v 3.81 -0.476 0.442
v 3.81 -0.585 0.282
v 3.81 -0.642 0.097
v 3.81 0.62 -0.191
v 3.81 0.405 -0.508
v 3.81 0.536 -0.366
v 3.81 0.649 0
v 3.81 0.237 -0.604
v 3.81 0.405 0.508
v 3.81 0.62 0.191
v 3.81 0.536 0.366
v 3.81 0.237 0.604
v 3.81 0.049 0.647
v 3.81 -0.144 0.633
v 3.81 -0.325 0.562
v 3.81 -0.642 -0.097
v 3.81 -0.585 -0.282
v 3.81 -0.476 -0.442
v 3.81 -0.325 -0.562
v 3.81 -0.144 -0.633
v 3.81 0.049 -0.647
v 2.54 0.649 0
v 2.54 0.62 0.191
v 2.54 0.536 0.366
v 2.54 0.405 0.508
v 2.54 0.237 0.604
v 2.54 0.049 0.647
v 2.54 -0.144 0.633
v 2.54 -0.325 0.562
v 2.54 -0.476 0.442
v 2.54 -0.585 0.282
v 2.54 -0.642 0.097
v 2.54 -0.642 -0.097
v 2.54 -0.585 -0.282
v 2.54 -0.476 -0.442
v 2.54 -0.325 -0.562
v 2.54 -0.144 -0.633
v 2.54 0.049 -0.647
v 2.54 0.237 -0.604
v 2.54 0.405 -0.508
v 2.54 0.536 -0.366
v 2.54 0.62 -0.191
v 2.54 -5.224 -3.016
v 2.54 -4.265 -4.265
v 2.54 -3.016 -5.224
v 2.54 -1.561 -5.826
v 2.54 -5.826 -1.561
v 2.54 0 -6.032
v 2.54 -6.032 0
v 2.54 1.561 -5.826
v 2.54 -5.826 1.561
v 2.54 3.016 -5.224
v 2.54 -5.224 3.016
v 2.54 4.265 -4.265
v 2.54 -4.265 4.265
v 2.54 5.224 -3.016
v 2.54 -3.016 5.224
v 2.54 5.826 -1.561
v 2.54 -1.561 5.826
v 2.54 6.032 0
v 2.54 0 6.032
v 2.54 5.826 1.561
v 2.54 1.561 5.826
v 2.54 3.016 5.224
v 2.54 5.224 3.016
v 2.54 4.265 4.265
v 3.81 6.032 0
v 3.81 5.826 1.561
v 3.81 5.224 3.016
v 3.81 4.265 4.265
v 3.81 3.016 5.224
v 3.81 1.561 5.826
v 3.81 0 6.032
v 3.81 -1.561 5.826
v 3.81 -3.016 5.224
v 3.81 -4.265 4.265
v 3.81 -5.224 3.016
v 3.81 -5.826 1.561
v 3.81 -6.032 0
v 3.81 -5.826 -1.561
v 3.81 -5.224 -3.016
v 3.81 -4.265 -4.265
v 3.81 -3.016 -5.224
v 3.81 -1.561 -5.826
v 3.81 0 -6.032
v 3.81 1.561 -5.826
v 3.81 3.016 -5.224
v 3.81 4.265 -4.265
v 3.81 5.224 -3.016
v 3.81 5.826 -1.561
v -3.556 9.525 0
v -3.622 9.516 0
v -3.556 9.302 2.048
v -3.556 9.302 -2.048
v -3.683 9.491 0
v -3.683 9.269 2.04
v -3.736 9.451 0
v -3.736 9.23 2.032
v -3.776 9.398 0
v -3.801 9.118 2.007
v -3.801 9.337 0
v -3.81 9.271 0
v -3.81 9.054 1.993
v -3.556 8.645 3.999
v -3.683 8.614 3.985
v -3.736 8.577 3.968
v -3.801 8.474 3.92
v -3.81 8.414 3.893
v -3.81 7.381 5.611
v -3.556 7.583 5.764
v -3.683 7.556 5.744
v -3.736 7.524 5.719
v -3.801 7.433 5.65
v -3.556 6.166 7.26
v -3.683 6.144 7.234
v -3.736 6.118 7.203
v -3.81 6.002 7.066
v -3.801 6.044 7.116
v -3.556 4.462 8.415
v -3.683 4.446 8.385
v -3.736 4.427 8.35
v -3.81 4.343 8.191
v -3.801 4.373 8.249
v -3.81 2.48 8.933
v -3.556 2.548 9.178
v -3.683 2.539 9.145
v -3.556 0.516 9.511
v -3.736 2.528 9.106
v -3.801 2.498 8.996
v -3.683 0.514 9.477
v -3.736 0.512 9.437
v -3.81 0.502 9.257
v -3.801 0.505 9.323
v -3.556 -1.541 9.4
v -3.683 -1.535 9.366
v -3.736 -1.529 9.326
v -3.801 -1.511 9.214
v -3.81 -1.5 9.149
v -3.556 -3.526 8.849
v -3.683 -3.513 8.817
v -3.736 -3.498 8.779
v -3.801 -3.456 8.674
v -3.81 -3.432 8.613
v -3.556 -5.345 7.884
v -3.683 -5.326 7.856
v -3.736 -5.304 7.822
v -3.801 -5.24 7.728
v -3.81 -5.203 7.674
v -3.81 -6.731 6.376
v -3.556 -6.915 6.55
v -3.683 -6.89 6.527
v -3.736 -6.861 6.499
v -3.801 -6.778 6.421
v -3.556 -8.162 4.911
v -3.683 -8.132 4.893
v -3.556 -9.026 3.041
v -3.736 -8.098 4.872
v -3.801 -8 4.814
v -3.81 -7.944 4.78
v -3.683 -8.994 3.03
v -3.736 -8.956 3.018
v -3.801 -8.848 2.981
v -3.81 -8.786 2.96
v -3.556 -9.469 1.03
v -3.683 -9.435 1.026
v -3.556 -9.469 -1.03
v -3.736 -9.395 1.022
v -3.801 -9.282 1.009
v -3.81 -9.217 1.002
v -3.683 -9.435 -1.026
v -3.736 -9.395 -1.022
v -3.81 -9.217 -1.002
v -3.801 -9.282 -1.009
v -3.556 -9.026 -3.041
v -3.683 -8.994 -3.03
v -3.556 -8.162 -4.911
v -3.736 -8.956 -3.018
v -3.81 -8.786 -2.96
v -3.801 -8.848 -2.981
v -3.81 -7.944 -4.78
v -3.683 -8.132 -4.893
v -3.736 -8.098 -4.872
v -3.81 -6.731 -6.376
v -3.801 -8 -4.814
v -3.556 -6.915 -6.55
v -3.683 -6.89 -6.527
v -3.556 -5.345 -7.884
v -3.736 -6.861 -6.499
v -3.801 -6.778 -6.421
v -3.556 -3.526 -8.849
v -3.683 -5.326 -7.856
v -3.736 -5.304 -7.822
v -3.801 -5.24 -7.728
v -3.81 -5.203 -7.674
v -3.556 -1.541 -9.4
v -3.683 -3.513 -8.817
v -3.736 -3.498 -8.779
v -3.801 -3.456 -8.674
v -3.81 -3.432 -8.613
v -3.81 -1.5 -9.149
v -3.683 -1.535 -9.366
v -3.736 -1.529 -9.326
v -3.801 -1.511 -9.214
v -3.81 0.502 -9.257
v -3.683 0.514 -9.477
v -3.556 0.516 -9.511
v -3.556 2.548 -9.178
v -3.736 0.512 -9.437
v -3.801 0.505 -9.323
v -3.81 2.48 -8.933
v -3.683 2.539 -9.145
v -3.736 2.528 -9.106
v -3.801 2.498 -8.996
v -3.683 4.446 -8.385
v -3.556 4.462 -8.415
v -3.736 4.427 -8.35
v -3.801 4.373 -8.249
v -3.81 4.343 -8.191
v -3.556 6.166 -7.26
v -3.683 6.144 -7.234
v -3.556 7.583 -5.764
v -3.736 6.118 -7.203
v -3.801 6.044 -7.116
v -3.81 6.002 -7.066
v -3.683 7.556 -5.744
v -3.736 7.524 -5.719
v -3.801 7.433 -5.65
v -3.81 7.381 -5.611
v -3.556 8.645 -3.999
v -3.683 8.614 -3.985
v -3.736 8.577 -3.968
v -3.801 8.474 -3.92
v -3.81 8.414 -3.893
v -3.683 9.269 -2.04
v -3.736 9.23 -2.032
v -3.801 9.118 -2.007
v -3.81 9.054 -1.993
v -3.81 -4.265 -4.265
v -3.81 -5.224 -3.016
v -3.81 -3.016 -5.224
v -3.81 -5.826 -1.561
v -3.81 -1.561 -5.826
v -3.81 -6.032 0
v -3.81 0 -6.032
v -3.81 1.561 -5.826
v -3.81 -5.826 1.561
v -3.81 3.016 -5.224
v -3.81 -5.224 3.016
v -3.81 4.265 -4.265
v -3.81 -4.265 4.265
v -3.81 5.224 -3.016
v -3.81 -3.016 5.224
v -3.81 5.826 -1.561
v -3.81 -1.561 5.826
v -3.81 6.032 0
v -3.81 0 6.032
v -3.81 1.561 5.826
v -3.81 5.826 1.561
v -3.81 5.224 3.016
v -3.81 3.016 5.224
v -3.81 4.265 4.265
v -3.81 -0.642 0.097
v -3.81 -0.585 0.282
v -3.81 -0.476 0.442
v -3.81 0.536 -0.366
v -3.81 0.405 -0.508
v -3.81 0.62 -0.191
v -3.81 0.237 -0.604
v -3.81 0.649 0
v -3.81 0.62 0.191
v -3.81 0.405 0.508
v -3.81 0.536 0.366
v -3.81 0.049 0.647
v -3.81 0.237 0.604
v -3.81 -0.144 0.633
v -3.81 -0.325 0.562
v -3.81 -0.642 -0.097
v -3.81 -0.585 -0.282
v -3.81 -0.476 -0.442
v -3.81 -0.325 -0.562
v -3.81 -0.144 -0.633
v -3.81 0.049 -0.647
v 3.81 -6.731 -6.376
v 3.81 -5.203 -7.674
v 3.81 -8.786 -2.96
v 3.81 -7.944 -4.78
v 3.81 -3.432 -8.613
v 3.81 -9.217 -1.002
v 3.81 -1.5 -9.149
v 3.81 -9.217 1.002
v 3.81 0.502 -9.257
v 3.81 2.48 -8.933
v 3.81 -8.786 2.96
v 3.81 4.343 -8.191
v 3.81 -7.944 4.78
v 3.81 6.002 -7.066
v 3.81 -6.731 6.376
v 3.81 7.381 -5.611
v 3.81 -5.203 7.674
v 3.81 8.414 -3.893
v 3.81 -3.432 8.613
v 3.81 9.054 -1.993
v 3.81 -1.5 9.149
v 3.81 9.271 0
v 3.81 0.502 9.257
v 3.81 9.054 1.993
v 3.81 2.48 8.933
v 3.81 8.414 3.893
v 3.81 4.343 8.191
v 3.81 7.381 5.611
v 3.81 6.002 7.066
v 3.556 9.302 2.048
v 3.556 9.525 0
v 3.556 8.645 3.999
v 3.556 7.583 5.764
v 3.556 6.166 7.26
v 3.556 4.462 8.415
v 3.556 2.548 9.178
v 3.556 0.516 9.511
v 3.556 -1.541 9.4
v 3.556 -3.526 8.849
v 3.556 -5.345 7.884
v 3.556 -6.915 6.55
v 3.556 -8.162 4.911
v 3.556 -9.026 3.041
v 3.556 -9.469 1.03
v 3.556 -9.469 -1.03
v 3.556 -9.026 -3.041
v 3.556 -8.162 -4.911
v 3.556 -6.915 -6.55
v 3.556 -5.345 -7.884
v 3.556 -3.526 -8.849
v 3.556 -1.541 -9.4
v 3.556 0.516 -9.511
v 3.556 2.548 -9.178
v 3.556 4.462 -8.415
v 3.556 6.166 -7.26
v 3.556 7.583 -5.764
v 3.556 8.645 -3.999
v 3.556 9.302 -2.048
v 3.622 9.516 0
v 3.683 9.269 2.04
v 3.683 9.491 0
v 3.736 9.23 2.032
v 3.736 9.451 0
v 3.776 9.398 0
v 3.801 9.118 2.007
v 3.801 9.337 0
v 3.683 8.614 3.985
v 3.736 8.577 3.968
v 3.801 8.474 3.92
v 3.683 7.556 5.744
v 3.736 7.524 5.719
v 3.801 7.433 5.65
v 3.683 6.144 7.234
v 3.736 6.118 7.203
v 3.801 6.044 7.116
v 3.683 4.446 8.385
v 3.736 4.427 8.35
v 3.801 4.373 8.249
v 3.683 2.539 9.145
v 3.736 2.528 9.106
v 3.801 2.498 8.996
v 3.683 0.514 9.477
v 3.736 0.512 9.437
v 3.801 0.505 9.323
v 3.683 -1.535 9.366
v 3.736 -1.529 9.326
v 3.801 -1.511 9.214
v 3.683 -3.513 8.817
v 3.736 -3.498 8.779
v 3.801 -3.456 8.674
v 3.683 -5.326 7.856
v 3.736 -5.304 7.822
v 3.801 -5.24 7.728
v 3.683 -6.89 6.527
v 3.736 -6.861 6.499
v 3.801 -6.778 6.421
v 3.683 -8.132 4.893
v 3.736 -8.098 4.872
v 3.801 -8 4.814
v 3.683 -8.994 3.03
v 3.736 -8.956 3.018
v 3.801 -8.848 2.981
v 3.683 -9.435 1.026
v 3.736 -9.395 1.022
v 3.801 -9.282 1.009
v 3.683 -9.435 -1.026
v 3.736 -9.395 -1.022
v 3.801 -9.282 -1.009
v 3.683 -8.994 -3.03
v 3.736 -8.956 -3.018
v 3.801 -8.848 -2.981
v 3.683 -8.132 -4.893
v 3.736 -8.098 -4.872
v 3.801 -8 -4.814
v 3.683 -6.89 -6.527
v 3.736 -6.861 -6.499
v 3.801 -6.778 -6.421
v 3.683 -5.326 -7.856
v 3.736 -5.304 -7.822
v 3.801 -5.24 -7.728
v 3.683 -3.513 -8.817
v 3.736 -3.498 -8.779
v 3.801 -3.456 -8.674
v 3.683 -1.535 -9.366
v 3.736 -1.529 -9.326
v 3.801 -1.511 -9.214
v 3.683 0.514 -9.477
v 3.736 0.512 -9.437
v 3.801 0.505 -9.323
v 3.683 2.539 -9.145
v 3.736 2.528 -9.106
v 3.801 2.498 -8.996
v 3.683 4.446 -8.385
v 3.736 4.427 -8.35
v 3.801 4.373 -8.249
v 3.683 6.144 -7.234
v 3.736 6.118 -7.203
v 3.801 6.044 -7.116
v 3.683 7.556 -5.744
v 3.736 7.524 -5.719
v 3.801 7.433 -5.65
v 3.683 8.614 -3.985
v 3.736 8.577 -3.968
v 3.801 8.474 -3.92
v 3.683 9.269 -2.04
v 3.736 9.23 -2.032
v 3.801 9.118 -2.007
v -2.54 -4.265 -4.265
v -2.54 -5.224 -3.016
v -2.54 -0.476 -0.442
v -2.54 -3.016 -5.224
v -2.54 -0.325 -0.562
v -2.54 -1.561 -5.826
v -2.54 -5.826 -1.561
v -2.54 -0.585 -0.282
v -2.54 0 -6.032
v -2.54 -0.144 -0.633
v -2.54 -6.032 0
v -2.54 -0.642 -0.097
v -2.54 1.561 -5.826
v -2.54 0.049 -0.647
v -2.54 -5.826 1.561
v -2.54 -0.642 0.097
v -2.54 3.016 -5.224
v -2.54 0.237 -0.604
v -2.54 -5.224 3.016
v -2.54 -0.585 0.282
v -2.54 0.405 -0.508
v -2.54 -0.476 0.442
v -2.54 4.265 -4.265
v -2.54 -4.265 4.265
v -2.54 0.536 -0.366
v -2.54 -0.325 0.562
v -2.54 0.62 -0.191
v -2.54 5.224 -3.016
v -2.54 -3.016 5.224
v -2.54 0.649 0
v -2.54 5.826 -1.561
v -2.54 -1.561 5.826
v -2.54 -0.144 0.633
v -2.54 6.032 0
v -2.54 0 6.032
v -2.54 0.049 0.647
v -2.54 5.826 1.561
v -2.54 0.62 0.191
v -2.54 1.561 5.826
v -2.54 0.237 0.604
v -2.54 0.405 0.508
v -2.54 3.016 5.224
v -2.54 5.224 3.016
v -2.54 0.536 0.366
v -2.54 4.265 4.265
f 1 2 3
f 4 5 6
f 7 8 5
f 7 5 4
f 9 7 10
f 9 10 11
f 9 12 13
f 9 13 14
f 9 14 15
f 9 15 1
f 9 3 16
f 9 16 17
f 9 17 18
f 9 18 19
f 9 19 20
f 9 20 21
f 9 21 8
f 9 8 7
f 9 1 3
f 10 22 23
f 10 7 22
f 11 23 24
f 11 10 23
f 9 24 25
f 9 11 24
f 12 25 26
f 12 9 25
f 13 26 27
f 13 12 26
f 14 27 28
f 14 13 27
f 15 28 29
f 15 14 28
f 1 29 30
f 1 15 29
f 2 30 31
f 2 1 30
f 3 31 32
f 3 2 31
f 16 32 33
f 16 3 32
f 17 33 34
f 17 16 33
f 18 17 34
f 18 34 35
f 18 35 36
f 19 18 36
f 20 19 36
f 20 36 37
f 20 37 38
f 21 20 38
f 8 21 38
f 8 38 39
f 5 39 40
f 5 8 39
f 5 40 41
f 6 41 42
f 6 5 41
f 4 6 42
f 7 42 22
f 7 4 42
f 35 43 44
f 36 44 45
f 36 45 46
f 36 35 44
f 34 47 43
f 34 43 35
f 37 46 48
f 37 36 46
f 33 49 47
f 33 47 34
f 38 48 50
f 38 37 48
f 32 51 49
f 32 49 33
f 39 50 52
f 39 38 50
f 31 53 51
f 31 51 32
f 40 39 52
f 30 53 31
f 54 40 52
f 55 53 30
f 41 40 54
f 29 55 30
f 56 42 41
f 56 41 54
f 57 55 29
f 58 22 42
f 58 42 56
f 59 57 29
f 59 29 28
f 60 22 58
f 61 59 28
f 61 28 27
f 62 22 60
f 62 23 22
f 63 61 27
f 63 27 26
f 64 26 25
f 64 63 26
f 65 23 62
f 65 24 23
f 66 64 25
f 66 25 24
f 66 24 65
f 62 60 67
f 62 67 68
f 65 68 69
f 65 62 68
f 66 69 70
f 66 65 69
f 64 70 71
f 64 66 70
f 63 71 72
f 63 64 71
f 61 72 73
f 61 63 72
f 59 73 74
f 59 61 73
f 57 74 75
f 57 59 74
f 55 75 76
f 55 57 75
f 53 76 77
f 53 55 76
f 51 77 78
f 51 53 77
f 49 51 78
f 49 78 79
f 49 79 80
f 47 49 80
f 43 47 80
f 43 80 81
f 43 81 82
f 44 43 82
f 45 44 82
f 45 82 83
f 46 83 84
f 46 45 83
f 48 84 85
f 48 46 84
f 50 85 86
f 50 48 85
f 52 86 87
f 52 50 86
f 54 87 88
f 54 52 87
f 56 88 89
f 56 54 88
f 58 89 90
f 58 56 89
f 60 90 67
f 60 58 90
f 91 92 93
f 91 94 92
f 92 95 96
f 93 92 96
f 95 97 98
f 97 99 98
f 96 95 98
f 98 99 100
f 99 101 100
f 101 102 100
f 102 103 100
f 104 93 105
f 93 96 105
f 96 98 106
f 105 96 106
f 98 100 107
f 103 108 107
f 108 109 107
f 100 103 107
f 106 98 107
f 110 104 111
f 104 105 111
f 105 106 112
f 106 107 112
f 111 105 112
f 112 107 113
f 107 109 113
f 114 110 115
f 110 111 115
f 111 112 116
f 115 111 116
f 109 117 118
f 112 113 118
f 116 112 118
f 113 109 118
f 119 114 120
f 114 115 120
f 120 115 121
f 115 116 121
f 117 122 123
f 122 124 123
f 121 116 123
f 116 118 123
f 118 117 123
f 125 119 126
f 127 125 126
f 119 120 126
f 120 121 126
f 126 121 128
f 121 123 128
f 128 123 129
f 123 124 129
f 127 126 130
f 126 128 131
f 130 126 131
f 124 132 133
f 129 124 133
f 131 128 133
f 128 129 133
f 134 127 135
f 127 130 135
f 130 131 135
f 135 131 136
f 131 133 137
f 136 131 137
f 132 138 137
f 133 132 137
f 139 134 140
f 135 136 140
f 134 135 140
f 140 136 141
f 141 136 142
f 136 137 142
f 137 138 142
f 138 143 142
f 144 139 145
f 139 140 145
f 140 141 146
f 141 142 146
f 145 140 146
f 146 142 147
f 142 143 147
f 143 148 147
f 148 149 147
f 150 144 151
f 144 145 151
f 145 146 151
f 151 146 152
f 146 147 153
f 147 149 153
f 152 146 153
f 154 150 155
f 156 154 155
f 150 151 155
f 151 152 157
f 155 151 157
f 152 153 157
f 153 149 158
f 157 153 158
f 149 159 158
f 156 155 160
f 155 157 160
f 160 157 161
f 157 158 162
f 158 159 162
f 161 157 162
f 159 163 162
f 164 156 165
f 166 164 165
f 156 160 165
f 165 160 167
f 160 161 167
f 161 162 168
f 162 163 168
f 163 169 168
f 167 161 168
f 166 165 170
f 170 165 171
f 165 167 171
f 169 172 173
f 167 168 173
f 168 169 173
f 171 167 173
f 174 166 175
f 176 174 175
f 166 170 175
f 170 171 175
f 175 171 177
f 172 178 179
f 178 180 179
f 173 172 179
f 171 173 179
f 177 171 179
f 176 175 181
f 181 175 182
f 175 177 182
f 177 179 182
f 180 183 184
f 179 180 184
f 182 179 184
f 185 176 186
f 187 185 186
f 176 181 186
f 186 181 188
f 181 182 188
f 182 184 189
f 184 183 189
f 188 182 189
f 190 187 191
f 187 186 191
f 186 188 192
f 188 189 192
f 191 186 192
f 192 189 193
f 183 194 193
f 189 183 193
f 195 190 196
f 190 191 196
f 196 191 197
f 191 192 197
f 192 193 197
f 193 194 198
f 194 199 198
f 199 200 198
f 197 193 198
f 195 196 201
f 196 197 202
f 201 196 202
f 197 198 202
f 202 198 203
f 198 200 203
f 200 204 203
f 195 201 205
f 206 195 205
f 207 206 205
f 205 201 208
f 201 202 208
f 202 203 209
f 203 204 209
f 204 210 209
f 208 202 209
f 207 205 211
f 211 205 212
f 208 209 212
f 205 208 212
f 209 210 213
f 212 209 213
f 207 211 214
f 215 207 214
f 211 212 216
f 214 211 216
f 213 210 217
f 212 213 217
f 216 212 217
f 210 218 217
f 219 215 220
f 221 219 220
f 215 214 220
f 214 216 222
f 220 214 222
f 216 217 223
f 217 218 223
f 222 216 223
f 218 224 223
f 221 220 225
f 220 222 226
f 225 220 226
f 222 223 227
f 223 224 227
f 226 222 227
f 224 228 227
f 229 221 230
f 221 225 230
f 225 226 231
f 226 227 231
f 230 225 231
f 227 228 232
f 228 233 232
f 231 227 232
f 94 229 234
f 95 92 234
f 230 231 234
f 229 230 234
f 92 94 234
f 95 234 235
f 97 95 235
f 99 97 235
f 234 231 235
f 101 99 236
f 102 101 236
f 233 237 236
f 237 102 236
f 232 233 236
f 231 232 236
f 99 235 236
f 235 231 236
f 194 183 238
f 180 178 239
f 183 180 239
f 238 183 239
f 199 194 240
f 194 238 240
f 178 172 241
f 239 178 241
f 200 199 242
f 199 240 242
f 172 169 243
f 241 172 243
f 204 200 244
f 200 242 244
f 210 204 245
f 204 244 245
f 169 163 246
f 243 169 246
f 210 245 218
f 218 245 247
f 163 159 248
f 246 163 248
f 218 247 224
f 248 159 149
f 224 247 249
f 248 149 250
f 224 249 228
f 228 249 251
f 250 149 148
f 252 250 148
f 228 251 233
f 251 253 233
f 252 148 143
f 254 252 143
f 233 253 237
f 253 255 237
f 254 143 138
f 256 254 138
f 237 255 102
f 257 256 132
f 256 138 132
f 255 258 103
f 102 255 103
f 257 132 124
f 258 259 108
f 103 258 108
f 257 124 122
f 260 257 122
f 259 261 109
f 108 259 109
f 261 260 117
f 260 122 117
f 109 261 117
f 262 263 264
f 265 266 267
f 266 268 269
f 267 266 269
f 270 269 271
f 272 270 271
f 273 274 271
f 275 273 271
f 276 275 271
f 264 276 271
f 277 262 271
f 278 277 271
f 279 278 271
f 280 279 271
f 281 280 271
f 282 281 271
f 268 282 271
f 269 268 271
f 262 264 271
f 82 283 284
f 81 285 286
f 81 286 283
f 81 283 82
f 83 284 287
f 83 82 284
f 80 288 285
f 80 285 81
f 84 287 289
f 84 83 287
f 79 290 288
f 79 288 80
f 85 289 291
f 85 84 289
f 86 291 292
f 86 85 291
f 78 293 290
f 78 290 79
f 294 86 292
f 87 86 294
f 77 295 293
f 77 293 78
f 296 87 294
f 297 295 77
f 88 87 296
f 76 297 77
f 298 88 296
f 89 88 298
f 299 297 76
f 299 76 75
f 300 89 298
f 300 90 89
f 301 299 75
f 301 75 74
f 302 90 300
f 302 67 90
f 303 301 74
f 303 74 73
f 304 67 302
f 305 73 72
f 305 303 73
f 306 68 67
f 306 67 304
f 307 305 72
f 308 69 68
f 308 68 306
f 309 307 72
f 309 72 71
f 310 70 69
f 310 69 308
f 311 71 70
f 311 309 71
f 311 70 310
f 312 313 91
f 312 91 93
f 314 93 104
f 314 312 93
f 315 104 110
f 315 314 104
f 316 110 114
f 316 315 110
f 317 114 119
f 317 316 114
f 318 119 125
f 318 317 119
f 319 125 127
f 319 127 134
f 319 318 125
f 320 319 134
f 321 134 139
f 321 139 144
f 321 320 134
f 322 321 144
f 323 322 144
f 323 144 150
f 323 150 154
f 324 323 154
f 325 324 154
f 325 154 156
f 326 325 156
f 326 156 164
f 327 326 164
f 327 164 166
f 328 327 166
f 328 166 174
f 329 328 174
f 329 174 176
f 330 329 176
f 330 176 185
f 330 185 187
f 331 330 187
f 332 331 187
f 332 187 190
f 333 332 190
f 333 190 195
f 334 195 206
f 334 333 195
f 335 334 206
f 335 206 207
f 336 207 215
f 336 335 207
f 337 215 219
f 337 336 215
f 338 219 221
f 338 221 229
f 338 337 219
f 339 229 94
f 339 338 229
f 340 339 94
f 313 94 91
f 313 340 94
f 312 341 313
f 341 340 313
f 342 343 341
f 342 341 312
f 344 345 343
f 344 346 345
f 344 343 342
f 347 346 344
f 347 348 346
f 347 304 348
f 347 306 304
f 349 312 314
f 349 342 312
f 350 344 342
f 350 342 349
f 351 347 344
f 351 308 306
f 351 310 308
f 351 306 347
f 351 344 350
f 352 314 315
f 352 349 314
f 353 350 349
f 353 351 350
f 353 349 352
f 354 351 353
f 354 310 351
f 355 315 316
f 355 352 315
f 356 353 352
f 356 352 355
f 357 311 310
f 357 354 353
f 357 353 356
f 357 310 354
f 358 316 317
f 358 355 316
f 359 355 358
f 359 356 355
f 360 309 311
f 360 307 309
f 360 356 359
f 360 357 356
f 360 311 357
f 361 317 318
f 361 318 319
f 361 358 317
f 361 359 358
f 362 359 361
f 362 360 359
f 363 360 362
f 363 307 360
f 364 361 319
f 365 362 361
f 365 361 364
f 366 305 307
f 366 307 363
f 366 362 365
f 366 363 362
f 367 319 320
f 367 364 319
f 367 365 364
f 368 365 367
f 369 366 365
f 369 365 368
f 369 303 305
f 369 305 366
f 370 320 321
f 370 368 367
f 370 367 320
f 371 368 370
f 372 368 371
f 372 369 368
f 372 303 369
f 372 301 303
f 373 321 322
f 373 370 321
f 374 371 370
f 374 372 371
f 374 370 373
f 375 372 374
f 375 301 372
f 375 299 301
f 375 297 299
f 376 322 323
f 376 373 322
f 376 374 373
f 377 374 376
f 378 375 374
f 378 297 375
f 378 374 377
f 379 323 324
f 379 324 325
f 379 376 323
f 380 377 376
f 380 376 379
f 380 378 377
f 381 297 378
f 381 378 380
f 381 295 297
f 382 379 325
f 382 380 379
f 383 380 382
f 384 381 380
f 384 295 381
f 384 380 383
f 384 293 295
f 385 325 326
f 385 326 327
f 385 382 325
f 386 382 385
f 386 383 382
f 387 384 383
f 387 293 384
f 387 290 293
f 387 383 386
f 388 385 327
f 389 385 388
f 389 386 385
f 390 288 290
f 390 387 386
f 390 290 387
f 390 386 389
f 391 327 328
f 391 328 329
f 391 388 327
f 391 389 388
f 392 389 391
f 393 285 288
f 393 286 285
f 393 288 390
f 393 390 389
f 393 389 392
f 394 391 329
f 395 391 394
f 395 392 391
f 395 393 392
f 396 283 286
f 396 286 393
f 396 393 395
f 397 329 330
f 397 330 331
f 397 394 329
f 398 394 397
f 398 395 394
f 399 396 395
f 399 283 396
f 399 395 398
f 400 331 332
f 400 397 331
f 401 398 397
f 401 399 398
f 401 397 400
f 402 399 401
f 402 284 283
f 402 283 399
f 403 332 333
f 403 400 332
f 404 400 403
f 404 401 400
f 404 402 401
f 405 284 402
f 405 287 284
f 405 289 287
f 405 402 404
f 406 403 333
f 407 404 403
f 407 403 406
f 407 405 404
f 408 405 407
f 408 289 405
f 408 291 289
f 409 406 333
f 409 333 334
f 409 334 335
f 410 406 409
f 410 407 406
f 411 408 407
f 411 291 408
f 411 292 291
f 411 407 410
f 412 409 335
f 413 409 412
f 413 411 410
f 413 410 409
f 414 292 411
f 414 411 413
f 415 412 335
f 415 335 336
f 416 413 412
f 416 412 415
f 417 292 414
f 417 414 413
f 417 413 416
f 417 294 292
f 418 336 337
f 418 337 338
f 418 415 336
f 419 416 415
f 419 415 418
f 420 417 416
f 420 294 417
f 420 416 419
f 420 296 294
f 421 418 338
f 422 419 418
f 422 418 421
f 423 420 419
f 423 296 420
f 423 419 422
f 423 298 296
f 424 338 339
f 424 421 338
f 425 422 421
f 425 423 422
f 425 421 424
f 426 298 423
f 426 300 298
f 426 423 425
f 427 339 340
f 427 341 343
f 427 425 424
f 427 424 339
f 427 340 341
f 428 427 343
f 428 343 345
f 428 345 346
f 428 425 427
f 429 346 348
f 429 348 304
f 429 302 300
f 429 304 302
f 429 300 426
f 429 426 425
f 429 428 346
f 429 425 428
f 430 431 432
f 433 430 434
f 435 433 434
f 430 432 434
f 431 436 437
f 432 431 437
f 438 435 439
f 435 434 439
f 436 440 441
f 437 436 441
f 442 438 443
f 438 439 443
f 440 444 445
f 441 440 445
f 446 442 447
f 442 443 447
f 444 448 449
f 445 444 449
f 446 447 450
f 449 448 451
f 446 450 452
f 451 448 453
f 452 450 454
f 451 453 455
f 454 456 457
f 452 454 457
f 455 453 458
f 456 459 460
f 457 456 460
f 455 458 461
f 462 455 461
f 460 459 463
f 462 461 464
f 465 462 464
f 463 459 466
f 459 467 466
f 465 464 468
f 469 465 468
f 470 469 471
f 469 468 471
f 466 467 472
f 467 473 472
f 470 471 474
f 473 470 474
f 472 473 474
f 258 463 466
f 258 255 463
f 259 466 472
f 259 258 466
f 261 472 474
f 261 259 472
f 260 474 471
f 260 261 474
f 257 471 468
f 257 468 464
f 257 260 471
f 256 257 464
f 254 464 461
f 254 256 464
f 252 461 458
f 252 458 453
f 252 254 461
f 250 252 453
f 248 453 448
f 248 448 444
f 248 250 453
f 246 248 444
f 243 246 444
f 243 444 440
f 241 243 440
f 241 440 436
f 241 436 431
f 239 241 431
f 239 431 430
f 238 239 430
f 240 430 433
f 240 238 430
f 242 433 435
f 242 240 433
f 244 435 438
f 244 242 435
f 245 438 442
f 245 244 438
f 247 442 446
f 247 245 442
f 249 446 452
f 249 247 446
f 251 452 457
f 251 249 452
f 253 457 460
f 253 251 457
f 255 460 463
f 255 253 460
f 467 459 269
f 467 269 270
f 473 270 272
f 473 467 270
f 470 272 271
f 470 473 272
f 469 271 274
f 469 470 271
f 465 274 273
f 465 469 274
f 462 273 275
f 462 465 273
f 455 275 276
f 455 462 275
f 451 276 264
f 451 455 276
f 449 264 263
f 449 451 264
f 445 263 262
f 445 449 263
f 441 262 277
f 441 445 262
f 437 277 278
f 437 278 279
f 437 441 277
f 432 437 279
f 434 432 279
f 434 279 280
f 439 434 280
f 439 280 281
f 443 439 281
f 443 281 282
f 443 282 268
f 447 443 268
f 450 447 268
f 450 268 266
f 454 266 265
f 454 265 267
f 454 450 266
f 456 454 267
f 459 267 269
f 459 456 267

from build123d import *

# Parameters (mm, degrees)
F0_R     = 0.649287
F1_DEPTH = 3.81
F0_R_2   = 6.031813
F2_DEPTH = 2.54
F0_R_3   = 9.525
F3_DEPTH = 3.81
F4_R     = 0.254


with BuildPart() as f1:
    # F0 (on Right) → F1 (new body, symmetric)
    with BuildSketch(Plane.YZ):
        Circle(F0_R)
    extrude(amount=F1_DEPTH, both=True)

    # F0 (on Right) → F2 (join, symmetric)
    with BuildSketch(Plane.YZ):
        Circle(F0_R_2)
        Circle(F0_R, mode=Mode.SUBTRACT)
    extrude(amount=F2_DEPTH, both=True)

    # F0 (on Right) → F3 (join, symmetric)
    with BuildSketch(Plane.YZ):
        Circle(F0_R_3)
        Circle(F0_R_2, mode=Mode.SUBTRACT)
    extrude(amount=F3_DEPTH, both=True)

    # F4
    f4_edges = [f1.edges().sort_by_distance(p)[0] for p in [
        (3.81, -9.525, 0),
        (-3.81, -9.525, 0),
    ]]
    fillet(f4_edges, radius=F4_R)


solid = f1.part
